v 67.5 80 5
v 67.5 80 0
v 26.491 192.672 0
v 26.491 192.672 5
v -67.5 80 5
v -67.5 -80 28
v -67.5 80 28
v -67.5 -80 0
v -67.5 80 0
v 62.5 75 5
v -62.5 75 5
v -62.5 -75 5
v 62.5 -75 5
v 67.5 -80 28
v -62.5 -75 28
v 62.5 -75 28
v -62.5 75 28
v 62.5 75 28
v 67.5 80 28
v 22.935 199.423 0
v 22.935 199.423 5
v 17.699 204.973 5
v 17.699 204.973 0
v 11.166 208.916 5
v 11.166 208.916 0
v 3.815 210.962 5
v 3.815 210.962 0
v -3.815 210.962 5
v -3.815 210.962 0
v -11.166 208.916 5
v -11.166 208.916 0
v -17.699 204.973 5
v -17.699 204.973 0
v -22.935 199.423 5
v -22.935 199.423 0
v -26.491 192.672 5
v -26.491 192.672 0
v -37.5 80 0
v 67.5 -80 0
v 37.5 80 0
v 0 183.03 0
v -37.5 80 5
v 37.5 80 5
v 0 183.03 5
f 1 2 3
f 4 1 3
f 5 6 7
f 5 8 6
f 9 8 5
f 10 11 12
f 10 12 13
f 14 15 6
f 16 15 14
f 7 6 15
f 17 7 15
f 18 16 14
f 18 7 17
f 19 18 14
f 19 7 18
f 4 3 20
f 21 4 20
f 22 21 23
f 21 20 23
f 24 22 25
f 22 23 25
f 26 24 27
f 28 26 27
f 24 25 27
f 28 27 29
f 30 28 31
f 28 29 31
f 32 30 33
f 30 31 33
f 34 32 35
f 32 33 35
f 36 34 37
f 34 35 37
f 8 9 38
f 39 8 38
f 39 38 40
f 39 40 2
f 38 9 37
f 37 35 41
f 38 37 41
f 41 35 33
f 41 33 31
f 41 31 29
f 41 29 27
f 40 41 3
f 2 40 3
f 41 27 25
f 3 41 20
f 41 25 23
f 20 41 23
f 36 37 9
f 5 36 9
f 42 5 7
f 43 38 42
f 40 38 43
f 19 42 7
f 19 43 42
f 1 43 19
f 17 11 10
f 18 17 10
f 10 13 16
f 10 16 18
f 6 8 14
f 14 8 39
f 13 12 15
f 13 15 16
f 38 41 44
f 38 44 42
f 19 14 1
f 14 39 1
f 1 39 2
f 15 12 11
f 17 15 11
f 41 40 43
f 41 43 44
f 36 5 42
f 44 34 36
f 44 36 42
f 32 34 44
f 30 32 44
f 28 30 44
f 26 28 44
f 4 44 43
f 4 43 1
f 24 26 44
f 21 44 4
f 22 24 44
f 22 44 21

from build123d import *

# Parameters (mm, degrees)
BOSS_EXTRUDE1_DEPTH = 5
SKETCH2_W           = 135
SKETCH2_H           = 160
SKETCH2_W_2         = 125
SKETCH2_H_2         = 150
BOSS_EXTRUDE2_DEPTH = 23


with BuildPart() as part:
    # Sketch1 → Boss-Extrude1 (new body)
    with BuildSketch(Plane.XY):
        with BuildLine():
            Line((-67.5, 80), (-67.5, -80))
            Line((-67.5, -80), (67.5, -80))
            Line((67.5, -80), (67.5, 80))
            Line((67.5, 80), (26.490666647, 192.672217375))
            ThreePointArc((26.490666647, 192.672217375), (0, 211.221181853), (-26.490666647, 192.672217375))
            Line((-26.490666647, 192.672217375), (-67.5, 80))
        make_face()
        Polygon((-37.5, 80), (37.5, 80), (0, 183.03040323), align=None, mode=Mode.SUBTRACT)
    extrude(amount=BOSS_EXTRUDE1_DEPTH)

    # Sketch2 → Boss-Extrude2 (add)
    with BuildSketch(Plane.XY.offset(5)):
        Rectangle(SKETCH2_W, SKETCH2_H)
        Rectangle(SKETCH2_W_2, SKETCH2_H_2, mode=Mode.SUBTRACT)
    extrude(amount=BOSS_EXTRUDE2_DEPTH)


solid = part.part
